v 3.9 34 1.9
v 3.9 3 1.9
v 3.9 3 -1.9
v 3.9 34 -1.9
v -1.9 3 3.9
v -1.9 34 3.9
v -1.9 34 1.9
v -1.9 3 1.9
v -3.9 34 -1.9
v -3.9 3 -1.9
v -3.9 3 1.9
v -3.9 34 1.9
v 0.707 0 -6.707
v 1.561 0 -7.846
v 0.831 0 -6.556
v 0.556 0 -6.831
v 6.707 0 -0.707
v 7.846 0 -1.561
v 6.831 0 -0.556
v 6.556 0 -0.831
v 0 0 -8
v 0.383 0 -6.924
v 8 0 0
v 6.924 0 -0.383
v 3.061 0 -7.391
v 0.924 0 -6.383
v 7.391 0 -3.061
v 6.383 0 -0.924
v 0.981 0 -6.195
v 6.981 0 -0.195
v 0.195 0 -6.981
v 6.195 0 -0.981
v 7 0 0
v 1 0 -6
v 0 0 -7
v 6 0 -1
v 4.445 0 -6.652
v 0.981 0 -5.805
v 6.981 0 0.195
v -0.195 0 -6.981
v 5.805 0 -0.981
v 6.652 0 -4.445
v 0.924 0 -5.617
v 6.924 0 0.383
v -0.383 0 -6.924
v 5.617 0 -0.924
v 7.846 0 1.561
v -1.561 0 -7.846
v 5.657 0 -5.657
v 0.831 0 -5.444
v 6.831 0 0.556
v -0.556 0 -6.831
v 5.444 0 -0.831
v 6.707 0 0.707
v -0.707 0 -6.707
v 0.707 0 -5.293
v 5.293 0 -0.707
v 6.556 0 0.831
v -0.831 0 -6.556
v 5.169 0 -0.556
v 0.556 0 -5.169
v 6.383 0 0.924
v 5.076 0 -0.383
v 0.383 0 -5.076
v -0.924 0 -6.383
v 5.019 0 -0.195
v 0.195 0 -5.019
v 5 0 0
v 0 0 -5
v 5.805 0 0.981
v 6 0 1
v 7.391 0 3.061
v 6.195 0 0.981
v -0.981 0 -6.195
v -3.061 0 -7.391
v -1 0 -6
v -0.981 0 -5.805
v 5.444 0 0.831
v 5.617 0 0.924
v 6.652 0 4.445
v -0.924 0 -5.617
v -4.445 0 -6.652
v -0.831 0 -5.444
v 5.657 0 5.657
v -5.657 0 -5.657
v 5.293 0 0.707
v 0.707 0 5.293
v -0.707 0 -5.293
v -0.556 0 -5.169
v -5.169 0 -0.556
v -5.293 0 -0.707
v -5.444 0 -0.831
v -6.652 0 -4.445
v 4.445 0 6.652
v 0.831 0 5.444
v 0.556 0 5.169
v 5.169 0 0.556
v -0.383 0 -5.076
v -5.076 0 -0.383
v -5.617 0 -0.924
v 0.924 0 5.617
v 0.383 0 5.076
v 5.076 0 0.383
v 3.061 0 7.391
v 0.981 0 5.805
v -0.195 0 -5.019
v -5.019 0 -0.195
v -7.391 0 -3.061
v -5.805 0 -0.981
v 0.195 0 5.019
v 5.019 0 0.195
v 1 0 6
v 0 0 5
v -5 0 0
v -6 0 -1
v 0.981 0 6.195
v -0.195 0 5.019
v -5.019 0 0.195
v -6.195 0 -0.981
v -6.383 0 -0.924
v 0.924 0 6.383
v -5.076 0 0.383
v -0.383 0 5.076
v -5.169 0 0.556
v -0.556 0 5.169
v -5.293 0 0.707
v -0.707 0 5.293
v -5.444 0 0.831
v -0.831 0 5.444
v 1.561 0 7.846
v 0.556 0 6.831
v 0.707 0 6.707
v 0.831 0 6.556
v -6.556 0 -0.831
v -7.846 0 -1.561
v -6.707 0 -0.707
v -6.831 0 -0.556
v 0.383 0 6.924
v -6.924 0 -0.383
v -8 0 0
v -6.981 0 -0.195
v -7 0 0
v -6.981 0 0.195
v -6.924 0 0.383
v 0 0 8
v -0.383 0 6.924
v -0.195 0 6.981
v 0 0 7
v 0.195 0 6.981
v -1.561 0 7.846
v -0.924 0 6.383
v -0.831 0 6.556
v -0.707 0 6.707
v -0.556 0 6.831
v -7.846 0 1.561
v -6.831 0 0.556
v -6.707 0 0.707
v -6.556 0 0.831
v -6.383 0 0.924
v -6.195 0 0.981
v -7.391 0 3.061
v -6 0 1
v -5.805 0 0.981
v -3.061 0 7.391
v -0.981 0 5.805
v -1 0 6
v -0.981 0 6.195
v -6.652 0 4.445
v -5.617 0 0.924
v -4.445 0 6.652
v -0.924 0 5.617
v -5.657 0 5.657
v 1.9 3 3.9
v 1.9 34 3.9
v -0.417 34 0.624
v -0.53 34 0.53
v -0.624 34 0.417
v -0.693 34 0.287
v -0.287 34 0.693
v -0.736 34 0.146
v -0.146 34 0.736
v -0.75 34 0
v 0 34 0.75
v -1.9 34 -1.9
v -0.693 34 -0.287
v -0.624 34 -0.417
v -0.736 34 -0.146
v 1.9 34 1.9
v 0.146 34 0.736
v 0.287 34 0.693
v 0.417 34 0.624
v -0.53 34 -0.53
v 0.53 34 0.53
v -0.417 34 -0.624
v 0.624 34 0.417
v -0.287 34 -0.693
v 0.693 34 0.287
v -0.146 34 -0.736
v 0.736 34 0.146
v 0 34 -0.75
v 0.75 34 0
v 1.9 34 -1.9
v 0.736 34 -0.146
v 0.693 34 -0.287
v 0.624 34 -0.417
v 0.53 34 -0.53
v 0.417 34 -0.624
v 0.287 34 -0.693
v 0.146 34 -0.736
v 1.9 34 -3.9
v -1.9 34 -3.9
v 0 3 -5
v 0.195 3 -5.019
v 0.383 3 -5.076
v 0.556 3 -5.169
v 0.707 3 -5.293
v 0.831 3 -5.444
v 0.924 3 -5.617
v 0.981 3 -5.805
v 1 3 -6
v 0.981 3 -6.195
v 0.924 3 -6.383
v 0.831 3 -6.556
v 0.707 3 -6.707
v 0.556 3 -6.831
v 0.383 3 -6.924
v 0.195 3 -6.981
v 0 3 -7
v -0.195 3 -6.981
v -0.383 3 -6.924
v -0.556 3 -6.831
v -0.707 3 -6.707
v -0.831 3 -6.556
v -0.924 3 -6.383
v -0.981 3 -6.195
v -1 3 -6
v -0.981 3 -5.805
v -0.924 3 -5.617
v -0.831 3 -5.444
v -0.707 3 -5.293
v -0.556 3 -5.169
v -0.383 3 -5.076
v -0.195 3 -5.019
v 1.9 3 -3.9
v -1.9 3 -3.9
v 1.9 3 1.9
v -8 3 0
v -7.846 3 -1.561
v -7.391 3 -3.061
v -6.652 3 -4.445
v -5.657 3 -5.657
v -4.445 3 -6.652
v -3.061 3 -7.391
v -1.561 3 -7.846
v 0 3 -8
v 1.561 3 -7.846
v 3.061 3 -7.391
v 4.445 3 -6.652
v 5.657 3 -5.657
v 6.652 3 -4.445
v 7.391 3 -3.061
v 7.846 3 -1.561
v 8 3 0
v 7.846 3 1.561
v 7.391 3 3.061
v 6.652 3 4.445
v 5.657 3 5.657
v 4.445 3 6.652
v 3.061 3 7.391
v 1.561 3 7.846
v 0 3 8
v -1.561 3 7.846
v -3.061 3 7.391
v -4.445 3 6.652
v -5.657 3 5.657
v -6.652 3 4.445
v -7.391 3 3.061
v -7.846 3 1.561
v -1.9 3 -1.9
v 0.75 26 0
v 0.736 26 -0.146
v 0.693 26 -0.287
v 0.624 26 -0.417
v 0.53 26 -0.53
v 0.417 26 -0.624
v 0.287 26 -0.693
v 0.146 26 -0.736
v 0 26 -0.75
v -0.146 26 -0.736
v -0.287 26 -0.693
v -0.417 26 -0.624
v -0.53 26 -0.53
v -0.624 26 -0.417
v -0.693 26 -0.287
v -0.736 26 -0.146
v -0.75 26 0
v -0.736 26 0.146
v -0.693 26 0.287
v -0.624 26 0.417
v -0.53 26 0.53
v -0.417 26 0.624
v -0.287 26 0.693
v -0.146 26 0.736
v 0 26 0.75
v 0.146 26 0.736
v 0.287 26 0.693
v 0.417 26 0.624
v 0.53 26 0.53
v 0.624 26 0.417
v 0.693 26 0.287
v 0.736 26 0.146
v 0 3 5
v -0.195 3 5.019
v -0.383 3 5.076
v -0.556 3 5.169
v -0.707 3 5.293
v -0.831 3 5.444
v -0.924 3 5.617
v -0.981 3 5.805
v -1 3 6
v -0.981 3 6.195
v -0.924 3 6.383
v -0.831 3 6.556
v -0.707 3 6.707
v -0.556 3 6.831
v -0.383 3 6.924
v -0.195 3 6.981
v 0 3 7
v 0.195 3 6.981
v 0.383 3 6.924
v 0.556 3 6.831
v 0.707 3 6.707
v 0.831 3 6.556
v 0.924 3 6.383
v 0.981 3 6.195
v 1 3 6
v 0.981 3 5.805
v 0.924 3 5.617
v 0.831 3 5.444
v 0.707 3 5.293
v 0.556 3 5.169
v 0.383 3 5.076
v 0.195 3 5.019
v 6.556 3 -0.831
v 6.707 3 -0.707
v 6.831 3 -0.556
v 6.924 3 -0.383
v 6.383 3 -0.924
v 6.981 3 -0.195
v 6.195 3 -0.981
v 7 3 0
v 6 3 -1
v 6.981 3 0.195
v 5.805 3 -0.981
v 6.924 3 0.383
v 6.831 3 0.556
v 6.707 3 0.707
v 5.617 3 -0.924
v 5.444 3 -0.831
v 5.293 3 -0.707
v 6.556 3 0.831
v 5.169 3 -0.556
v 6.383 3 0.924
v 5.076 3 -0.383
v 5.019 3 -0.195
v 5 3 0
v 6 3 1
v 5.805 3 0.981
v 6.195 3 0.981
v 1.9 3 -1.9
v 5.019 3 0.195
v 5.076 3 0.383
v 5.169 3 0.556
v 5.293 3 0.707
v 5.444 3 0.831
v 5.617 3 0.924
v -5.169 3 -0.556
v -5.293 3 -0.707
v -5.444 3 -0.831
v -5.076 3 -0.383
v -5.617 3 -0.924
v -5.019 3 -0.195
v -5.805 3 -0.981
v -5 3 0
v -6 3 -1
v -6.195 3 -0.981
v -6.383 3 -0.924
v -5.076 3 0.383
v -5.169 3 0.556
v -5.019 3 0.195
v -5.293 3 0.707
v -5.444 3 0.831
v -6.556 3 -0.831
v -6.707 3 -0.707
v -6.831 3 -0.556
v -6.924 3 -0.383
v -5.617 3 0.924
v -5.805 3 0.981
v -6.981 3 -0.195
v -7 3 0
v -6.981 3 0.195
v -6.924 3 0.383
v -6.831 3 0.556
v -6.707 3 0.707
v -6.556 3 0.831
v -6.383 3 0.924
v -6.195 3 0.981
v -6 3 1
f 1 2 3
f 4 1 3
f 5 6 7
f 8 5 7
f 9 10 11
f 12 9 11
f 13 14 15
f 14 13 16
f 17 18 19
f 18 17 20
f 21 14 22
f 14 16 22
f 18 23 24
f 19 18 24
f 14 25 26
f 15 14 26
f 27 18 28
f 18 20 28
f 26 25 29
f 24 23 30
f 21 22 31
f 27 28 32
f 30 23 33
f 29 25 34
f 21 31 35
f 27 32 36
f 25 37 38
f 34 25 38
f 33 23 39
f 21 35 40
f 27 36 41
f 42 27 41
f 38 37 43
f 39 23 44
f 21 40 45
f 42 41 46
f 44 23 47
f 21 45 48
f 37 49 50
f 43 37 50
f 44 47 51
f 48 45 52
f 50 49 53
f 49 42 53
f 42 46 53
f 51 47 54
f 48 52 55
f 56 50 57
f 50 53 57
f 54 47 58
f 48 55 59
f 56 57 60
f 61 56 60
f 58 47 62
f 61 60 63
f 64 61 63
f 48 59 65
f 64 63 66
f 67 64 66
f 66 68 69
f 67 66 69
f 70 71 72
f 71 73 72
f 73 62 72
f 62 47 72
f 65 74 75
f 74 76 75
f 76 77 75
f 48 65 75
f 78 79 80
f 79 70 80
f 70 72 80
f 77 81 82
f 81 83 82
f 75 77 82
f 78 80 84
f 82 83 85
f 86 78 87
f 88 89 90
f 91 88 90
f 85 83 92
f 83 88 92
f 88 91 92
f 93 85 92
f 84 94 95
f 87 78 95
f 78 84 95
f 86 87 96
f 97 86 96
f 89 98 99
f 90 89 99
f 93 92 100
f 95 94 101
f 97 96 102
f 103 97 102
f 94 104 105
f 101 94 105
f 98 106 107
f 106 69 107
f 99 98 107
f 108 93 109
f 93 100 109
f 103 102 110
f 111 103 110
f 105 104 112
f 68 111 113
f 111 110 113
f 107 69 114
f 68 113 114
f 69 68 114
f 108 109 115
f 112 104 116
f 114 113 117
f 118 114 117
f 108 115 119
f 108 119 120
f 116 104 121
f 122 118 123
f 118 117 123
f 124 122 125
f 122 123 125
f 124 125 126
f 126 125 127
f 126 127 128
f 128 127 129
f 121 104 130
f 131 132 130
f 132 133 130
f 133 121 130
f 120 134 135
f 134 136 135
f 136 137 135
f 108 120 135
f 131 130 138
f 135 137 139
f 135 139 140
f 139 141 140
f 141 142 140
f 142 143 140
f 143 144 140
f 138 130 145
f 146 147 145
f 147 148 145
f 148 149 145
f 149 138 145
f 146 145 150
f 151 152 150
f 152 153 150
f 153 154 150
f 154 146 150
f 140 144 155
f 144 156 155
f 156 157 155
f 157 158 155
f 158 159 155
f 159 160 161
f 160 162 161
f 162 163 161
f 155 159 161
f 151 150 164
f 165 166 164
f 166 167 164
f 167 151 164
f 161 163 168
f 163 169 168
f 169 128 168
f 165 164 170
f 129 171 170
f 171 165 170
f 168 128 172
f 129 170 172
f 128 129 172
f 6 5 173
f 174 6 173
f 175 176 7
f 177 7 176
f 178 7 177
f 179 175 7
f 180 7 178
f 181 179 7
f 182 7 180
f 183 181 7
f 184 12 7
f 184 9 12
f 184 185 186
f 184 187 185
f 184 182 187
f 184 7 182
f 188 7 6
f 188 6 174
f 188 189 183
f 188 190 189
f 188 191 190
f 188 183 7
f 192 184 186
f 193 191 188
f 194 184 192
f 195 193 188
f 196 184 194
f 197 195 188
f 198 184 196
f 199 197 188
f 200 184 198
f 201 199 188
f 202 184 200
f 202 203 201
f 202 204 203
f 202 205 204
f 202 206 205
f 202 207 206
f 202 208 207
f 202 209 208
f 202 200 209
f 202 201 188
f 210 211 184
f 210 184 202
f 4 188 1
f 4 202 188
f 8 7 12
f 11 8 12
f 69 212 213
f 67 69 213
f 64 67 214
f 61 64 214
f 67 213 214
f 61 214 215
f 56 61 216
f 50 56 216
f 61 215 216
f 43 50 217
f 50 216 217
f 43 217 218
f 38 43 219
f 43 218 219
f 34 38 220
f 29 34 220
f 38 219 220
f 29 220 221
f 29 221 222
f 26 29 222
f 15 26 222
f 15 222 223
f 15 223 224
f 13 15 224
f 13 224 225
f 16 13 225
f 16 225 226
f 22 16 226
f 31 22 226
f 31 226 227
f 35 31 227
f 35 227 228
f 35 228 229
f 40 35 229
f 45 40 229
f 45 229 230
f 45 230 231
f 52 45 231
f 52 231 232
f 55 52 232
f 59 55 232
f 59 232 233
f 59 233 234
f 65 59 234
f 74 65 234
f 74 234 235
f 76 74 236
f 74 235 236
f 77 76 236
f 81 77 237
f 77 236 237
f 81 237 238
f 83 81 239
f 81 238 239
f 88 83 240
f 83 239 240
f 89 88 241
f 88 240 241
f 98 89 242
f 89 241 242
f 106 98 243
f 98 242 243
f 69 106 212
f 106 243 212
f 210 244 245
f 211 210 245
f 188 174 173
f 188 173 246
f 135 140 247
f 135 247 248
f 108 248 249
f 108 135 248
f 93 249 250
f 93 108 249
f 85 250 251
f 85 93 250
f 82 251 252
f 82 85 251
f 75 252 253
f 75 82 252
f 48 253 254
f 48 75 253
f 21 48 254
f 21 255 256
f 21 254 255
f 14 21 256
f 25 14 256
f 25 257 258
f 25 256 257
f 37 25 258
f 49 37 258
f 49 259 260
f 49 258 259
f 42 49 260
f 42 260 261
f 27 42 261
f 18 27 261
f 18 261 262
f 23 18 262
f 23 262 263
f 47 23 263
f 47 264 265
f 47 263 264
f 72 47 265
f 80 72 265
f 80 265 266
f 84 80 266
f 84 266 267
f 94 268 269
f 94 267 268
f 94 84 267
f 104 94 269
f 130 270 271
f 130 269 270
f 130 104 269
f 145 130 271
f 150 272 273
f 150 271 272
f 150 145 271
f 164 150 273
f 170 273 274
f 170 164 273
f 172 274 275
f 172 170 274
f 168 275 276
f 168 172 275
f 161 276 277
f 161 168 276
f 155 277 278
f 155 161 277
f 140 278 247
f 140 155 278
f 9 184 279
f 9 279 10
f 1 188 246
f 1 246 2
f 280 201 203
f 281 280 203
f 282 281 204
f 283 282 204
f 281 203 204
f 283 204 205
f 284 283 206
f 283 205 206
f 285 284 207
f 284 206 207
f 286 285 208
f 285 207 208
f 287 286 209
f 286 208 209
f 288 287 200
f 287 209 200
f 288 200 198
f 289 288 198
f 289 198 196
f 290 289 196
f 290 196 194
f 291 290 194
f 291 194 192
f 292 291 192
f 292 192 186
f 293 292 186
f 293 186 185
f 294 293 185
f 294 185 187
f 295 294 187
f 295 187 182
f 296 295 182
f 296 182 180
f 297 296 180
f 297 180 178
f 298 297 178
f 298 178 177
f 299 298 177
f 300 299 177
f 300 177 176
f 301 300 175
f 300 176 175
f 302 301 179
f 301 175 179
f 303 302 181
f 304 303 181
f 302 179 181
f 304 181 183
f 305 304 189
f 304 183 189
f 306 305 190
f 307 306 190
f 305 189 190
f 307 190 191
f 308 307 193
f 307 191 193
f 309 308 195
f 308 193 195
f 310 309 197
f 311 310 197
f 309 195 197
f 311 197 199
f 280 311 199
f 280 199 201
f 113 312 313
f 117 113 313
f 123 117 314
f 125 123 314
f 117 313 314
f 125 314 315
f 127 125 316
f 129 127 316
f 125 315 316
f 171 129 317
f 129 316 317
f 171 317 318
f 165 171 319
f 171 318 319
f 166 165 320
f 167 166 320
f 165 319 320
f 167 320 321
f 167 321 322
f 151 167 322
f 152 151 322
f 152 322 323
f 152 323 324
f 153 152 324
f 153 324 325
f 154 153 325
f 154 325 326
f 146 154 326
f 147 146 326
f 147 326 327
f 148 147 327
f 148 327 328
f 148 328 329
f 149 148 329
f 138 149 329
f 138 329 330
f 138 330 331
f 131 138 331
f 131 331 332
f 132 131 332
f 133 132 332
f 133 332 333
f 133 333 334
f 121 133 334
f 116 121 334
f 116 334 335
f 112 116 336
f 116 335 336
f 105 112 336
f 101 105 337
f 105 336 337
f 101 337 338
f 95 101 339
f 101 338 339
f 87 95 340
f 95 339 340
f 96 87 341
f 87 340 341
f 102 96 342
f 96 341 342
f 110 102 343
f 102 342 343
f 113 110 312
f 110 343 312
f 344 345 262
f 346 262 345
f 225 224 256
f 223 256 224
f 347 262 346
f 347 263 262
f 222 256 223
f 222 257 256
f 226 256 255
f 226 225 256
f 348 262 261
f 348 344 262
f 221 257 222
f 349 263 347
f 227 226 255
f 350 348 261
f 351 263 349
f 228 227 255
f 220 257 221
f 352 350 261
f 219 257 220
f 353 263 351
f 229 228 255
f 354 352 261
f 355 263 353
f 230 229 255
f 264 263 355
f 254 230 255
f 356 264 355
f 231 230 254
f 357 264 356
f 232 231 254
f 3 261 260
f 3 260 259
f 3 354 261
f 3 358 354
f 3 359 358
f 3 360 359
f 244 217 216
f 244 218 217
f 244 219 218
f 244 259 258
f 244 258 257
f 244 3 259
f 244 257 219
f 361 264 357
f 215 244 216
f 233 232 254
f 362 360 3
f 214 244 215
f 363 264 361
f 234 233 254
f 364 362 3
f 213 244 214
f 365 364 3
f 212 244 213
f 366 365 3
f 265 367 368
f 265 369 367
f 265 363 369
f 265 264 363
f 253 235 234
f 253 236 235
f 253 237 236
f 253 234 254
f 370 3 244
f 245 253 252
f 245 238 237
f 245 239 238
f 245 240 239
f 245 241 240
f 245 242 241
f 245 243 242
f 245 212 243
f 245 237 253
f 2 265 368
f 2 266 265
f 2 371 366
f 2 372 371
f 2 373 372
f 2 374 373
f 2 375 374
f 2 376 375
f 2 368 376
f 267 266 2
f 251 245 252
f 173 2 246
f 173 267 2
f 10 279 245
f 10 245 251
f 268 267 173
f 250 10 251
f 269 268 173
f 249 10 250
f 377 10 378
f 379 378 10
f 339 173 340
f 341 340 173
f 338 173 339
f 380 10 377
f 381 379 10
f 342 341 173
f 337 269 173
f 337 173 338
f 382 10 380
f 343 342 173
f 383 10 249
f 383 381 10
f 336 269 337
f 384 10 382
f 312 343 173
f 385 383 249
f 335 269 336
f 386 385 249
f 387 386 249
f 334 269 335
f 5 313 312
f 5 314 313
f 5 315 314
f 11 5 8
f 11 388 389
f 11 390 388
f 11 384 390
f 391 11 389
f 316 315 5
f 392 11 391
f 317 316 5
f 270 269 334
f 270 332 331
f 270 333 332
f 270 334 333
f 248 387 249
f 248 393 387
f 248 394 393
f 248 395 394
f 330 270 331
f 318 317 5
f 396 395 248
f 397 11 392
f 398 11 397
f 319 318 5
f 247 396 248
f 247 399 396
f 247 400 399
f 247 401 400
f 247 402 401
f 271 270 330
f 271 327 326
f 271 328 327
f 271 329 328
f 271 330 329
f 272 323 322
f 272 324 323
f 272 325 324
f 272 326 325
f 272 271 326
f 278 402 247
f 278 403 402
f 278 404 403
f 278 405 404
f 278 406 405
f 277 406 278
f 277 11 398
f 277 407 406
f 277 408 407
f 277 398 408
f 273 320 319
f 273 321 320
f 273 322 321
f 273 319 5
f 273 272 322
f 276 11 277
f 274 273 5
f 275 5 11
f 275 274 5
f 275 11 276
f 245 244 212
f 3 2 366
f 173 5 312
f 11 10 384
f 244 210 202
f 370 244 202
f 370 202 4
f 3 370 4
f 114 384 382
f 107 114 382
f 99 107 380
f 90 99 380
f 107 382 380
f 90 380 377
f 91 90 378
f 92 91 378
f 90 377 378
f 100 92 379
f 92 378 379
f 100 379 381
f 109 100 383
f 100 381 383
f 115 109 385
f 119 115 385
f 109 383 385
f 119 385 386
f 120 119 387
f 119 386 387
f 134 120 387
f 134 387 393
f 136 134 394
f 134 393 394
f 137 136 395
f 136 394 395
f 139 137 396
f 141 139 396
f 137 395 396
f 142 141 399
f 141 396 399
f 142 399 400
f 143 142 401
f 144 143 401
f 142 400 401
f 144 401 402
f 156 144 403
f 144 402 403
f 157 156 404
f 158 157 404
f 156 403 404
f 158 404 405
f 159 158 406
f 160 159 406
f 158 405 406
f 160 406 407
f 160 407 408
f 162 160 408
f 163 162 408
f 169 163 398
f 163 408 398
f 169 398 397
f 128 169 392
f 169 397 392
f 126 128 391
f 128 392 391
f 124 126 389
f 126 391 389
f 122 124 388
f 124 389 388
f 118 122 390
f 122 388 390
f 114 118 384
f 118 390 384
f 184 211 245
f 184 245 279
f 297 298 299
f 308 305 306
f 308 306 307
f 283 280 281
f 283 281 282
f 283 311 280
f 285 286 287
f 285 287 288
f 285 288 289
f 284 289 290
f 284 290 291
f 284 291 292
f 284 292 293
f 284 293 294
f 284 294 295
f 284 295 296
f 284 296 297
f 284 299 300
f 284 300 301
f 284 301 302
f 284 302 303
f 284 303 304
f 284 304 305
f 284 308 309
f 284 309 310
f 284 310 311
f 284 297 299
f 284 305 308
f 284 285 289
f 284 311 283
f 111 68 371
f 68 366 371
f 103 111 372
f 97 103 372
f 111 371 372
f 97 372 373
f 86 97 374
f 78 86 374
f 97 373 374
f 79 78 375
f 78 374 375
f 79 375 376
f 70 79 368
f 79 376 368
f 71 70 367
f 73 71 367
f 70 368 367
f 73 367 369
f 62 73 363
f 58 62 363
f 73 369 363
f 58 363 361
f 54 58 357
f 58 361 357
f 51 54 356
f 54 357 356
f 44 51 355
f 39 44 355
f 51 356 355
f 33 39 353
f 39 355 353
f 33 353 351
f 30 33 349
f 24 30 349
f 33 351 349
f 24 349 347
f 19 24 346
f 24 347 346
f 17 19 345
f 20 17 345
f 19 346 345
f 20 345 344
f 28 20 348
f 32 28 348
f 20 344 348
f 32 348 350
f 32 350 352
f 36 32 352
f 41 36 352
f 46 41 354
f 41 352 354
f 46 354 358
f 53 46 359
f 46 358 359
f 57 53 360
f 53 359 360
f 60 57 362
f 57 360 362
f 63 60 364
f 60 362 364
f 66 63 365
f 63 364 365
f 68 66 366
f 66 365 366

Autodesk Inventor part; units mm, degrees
ref_plane "YZ Plane" through (0, 0, 0) normal (1, 0, 0) x (0, 1, 0)
ref_plane "XZ Plane" through (0, 0, 0) normal (0, 1, 0) x (-1, 0, 0)
ref_plane "XY Plane" through (0, 0, 0) normal (0, 0, 1) x (1, 0, 0)
sketch "Sketch1" plane through (0, 0, 0) normal (0, 1, 0) x (-1, 0, 0)
  circle A0 centre (0, 0) radius 8
  dimension "d0" = 16
extrude "Extrusion1" add sketch "Sketch1" along normal blind 3
sketch "Sketch2" plane through (0, 3, 0) normal (0, 1, 0) x (1, 0, 0)
  circle A0 centre (-6, 0) radius 1
  point P0 (0, 0)
  dimension "d3" = 2
  dimension "d4" = 6
extrude "Extrusion2" cut sketch "Sketch2" against normal blind 3
pattern_circular "Circular Pattern1" count 4 over 360 about axis through (0, -10, 0) along (0, 1, 0) of "Extrusion2"
sketch "Sketch3" plane through (0, 3, 0) normal (0, 1, 0) x (1, 0, 0)
  line L0 (3.9, 3.9) -> (-3.9, 3.9)
  line L1 (-3.9, 3.9) -> (-3.9, -3.9)
  line L2 (-3.9, -3.9) -> (3.9, -3.9)
  line L3 (3.9, -3.9) -> (3.9, 3.9)
  line L4 (3.9, 3.9) -> (-3.9, -3.9) construction
  line L5 (-3.9, 3.9) -> (3.9, -3.9) construction
  line L6 (-3.9, -3.9) -> (-1.9, -3.9)
  line L7 (-1.9, -3.9) -> (-1.9, -1.9)
  line L8 (-1.9, -1.9) -> (-3.9, -1.9)
  line L9 (-3.9, -1.9) -> (-3.9, -3.9)
  line L10 (-3.9, 3.9) -> (-1.9, 3.9)
  line L11 (-1.9, 3.9) -> (-1.9, 1.9)
  line L12 (-1.9, 1.9) -> (-3.9, 1.9)
  line L13 (-3.9, 1.9) -> (-3.9, 3.9)
  line L14 (3.9, -3.9) -> (1.9, -3.9)
  line L15 (1.9, -3.9) -> (1.9, -1.9)
  line L16 (1.9, -1.9) -> (3.9, -1.9)
  line L17 (3.9, -1.9) -> (3.9, -3.9)
  line L18 (3.9, 3.9) -> (1.9, 3.9)
  line L19 (1.9, 3.9) -> (1.9, 1.9)
  line L20 (1.9, 1.9) -> (3.9, 1.9)
  line L21 (3.9, 1.9) -> (3.9, 3.9)
  point P0 (0, 0)
  point P1 (3.9, 1.9)
  point P2 (1.9, 3.9)
  point P3 (-1.9, 3.9)
  point P4 (-1.9, -3.9)
  point P5 (1.9, -3.9)
  dimension "d10" = 7.8
  dimension "d11" = 7.8
  dimension "d14" = 2
  dimension "d15" = 2
extrude "Extrusion3" add sketch "Sketch3" along normal blind 31 contours L19 L20 L3 L16 L15 L2 L7 L8 L1 L12 L11 L0
sketch "Sketch4" plane through (0, 34, 0) normal (0, 1, 0) x (1, 0, 0)
  circle A0 centre (0, 0) radius 0.75
  dimension "d16" = 1.5
extrude "Extrusion4" cut sketch "Sketch4" against normal blind 8
properties part number "XC330_motor_adaptor"
